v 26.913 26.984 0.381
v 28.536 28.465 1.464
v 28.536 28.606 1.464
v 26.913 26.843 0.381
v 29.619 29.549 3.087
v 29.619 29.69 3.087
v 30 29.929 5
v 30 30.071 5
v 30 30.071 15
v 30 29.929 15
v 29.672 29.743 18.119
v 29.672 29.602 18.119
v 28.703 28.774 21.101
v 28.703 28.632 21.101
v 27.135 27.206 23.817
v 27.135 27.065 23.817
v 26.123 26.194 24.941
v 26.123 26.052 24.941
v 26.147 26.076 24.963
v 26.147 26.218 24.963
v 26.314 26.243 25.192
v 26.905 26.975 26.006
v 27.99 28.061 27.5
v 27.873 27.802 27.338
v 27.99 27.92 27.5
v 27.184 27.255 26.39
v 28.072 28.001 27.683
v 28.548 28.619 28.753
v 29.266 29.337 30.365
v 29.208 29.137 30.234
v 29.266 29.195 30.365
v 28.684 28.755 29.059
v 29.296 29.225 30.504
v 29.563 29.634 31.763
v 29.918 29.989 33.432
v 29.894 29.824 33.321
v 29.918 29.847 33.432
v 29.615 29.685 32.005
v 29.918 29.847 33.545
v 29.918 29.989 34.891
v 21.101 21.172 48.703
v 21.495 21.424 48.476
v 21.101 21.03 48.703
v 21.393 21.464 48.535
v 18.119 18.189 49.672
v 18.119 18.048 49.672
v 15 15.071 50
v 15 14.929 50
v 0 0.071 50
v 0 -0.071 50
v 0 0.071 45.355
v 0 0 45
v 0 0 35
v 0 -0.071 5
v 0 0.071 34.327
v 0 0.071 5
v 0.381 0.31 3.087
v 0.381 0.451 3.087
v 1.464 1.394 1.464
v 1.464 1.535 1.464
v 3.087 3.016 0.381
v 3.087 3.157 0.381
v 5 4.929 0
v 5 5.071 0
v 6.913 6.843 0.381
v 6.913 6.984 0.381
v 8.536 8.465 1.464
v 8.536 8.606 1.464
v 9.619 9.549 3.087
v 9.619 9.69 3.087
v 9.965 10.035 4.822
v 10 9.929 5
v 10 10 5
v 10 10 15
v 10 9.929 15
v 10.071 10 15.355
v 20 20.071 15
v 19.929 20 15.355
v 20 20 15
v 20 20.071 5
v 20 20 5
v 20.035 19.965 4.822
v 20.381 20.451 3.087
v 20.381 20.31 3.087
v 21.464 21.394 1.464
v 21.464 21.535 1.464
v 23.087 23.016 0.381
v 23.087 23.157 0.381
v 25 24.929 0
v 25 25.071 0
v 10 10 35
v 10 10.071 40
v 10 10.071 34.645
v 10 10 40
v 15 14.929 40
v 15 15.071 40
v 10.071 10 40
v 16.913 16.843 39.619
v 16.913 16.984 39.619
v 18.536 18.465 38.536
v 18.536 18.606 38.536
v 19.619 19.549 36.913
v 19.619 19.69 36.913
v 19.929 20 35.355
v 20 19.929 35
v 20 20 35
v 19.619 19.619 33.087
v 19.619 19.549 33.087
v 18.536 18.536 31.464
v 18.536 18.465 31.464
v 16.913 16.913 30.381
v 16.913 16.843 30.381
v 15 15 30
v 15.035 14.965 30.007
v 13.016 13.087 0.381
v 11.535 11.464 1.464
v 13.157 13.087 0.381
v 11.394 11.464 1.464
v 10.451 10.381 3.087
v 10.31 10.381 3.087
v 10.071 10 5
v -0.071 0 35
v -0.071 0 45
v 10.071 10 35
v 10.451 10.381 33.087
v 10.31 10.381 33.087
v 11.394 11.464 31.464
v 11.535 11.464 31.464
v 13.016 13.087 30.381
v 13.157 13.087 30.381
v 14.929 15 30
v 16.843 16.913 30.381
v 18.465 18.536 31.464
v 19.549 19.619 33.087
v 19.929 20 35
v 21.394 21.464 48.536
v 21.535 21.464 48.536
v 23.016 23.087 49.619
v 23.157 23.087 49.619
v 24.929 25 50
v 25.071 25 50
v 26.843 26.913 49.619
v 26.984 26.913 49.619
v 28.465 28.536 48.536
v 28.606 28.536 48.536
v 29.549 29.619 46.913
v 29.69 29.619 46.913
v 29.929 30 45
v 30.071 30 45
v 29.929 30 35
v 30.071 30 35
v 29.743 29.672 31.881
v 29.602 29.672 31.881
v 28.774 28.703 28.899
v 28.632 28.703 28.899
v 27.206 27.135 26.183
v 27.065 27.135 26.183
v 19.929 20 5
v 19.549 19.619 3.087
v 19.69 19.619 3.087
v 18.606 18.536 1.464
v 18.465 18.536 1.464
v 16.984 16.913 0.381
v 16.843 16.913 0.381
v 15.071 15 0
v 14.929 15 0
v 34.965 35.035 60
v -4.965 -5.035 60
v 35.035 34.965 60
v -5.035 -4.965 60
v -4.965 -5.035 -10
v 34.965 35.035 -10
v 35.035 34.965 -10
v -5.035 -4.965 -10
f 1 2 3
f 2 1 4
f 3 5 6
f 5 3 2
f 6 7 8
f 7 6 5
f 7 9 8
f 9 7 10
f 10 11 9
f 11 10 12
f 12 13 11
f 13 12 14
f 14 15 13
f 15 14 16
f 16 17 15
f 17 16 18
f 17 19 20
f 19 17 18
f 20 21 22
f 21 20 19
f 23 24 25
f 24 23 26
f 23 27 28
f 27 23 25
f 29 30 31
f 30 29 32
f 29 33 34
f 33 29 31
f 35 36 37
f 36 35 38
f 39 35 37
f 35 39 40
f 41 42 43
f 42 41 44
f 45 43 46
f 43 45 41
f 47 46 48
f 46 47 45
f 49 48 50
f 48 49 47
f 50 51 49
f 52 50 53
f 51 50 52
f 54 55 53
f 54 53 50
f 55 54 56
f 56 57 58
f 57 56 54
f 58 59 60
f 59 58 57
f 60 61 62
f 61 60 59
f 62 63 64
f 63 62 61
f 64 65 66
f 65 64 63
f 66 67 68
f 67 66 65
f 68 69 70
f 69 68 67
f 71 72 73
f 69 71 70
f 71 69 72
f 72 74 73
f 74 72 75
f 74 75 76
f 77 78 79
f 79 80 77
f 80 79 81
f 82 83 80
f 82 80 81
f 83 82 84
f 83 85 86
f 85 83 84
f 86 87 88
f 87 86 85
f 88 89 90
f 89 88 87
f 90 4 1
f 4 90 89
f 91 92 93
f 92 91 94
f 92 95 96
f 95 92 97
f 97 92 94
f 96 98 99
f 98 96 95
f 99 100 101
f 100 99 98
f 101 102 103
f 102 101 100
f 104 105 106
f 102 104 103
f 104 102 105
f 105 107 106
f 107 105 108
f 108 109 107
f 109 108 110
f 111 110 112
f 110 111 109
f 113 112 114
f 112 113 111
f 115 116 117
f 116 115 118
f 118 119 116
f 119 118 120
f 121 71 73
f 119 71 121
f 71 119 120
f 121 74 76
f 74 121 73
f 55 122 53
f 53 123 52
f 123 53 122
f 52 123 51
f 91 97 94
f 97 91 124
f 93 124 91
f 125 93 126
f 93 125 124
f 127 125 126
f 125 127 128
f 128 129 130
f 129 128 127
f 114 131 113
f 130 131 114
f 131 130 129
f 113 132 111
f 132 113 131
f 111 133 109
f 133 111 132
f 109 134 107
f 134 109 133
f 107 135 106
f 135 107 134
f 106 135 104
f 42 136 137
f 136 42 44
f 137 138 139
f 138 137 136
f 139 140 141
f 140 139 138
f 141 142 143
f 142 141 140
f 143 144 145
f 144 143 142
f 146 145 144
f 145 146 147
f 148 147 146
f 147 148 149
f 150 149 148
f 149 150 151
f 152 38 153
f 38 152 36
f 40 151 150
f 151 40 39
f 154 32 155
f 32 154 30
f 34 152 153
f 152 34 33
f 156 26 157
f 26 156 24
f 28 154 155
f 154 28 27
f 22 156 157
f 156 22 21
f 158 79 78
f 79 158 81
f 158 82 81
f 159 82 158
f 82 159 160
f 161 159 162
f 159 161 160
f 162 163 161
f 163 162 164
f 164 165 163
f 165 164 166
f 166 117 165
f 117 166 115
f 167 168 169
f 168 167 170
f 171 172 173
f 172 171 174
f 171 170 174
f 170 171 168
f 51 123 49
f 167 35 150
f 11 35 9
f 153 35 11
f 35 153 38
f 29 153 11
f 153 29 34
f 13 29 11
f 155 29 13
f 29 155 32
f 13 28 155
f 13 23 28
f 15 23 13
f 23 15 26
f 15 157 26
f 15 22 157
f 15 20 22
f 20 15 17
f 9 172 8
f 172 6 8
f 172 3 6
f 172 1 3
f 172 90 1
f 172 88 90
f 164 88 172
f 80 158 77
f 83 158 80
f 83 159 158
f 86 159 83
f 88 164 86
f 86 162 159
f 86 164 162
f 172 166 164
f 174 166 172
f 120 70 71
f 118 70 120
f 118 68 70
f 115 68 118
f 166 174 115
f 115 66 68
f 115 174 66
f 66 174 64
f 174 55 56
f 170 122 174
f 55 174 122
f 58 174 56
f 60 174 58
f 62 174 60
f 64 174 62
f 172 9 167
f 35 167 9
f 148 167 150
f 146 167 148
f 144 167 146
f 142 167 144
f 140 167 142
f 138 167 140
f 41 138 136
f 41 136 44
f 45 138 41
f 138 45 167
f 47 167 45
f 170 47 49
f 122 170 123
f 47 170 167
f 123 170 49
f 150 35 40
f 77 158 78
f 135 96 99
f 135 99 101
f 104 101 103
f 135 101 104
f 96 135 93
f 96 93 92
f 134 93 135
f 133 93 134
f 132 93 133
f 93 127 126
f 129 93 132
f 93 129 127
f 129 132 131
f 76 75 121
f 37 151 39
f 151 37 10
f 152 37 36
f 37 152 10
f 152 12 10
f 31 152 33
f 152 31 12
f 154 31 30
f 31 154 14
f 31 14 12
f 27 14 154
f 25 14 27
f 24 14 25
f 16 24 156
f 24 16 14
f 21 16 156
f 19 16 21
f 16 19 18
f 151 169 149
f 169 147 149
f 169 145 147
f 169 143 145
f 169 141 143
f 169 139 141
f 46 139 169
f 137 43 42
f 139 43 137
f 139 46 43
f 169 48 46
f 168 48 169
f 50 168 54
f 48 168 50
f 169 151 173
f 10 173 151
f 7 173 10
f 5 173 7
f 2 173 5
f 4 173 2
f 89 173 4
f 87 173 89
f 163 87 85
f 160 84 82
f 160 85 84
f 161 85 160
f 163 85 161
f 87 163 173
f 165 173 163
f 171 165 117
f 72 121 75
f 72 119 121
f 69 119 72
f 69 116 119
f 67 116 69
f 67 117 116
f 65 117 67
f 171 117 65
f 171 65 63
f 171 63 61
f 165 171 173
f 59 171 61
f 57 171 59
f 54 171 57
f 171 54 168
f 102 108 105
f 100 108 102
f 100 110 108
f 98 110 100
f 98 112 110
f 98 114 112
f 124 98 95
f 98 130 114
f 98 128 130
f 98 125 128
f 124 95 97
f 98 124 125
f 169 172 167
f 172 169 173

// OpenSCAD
// file: ../RoxySaty.scad
module mU (x, y, r) {
    translate([x,y,0])
    rotate(r)
    union() {
        difference() {
            circle(15); 
            circle(5);
            translate([-15,0,0]) square(30);
        };
        translate([-15,0,0]) square(10);
        translate([-10,10,0]) circle(5);
        translate([5,0,0]) square(10);
        translate([10,10,0]) circle(5);
    };
};

module mPata(x, y, r) {
    translate([x,y,0])
    rotate(r) {
        translate([-5,0,0]) square([10,20]);
        translate([0,0,0]) circle(5);
    }
}
    
module R() {
    union() {
        mU(15,15,180);
        mU(15,35,90);
        translate([0,5,0]) square([10,45]);
    };
};
    
module O() {
    union() {
        mU(15,15,0);
        mU(15,35,180);
    };
};

module X() {
    union() {
        mU(15,35,0);
        mU(15,15,180);
    };
};

module Y() {
    union() {
        mU(15,35,0);
        mPata(15,5,0);
    };
};

module S() {
    union() {
        difference() {
            mU(15,35,-90);
            translate([15,20,0]) square([15,10]);
        }   
        difference() {
            mU(15,15,90);
            translate([0,20,0]) square([15,10]);
        }
    }
}

module A() {
    union() {
        translate([15,35,0]) difference() {
            circle(15);
            circle(5);
        }
        mU(15,15,180);
        translate([0,15,0]) square([10, 20]);
        translate([20,15,0]) square([10, 20]);
    };
};    

module T () {
    union() {
        mPata(15,5,0);
        mPata(25,45,90);
        mPata(5,45,-90);
        translate([10,20,0]) square([10,20]);
    }
}

module Roxy() {
    R();
    translate([40,0,0]) O();
    translate([80,0,0]) X();
    translate([120,0,0]) Y();
}
module Saty() {
    S();
    translate([40,0,0]) A();
    translate([80,0,0]) T();
    translate([120,0,0]) Y();
}
// file: ../bloques.scad
use <RoxySaty.scad>

module RoxySaty() {
  union() {
    translate([  0, 165, 0]) rotate([90, 0,  0]) linear_extrude(180) Roxy();
    translate([165, 150, 0]) rotate([90, 0,-90]) linear_extrude(180) Saty();
  }
}

module RoxySatyNeg() {
  difference() {
    translate([75, 75, 25]) cube([170, 170, 70], true);
    RoxySaty();
  }
}
// main file
use <../bloques.scad>
intervalo= 40;
offset=15;
anchoPanel = sqrt(2) * intervalo;
coords = [for (x =[offset: intervalo: 160]) for (y=[offset: intervalo: 160]) [x, y, 25]];

sec=0;
echo(len(coords));
intersection() {
    translate(coords[sec]) rotate([0,0,45]) cube([anchoPanel, 0.1, 70], true);
    RoxySatyNeg();
}
